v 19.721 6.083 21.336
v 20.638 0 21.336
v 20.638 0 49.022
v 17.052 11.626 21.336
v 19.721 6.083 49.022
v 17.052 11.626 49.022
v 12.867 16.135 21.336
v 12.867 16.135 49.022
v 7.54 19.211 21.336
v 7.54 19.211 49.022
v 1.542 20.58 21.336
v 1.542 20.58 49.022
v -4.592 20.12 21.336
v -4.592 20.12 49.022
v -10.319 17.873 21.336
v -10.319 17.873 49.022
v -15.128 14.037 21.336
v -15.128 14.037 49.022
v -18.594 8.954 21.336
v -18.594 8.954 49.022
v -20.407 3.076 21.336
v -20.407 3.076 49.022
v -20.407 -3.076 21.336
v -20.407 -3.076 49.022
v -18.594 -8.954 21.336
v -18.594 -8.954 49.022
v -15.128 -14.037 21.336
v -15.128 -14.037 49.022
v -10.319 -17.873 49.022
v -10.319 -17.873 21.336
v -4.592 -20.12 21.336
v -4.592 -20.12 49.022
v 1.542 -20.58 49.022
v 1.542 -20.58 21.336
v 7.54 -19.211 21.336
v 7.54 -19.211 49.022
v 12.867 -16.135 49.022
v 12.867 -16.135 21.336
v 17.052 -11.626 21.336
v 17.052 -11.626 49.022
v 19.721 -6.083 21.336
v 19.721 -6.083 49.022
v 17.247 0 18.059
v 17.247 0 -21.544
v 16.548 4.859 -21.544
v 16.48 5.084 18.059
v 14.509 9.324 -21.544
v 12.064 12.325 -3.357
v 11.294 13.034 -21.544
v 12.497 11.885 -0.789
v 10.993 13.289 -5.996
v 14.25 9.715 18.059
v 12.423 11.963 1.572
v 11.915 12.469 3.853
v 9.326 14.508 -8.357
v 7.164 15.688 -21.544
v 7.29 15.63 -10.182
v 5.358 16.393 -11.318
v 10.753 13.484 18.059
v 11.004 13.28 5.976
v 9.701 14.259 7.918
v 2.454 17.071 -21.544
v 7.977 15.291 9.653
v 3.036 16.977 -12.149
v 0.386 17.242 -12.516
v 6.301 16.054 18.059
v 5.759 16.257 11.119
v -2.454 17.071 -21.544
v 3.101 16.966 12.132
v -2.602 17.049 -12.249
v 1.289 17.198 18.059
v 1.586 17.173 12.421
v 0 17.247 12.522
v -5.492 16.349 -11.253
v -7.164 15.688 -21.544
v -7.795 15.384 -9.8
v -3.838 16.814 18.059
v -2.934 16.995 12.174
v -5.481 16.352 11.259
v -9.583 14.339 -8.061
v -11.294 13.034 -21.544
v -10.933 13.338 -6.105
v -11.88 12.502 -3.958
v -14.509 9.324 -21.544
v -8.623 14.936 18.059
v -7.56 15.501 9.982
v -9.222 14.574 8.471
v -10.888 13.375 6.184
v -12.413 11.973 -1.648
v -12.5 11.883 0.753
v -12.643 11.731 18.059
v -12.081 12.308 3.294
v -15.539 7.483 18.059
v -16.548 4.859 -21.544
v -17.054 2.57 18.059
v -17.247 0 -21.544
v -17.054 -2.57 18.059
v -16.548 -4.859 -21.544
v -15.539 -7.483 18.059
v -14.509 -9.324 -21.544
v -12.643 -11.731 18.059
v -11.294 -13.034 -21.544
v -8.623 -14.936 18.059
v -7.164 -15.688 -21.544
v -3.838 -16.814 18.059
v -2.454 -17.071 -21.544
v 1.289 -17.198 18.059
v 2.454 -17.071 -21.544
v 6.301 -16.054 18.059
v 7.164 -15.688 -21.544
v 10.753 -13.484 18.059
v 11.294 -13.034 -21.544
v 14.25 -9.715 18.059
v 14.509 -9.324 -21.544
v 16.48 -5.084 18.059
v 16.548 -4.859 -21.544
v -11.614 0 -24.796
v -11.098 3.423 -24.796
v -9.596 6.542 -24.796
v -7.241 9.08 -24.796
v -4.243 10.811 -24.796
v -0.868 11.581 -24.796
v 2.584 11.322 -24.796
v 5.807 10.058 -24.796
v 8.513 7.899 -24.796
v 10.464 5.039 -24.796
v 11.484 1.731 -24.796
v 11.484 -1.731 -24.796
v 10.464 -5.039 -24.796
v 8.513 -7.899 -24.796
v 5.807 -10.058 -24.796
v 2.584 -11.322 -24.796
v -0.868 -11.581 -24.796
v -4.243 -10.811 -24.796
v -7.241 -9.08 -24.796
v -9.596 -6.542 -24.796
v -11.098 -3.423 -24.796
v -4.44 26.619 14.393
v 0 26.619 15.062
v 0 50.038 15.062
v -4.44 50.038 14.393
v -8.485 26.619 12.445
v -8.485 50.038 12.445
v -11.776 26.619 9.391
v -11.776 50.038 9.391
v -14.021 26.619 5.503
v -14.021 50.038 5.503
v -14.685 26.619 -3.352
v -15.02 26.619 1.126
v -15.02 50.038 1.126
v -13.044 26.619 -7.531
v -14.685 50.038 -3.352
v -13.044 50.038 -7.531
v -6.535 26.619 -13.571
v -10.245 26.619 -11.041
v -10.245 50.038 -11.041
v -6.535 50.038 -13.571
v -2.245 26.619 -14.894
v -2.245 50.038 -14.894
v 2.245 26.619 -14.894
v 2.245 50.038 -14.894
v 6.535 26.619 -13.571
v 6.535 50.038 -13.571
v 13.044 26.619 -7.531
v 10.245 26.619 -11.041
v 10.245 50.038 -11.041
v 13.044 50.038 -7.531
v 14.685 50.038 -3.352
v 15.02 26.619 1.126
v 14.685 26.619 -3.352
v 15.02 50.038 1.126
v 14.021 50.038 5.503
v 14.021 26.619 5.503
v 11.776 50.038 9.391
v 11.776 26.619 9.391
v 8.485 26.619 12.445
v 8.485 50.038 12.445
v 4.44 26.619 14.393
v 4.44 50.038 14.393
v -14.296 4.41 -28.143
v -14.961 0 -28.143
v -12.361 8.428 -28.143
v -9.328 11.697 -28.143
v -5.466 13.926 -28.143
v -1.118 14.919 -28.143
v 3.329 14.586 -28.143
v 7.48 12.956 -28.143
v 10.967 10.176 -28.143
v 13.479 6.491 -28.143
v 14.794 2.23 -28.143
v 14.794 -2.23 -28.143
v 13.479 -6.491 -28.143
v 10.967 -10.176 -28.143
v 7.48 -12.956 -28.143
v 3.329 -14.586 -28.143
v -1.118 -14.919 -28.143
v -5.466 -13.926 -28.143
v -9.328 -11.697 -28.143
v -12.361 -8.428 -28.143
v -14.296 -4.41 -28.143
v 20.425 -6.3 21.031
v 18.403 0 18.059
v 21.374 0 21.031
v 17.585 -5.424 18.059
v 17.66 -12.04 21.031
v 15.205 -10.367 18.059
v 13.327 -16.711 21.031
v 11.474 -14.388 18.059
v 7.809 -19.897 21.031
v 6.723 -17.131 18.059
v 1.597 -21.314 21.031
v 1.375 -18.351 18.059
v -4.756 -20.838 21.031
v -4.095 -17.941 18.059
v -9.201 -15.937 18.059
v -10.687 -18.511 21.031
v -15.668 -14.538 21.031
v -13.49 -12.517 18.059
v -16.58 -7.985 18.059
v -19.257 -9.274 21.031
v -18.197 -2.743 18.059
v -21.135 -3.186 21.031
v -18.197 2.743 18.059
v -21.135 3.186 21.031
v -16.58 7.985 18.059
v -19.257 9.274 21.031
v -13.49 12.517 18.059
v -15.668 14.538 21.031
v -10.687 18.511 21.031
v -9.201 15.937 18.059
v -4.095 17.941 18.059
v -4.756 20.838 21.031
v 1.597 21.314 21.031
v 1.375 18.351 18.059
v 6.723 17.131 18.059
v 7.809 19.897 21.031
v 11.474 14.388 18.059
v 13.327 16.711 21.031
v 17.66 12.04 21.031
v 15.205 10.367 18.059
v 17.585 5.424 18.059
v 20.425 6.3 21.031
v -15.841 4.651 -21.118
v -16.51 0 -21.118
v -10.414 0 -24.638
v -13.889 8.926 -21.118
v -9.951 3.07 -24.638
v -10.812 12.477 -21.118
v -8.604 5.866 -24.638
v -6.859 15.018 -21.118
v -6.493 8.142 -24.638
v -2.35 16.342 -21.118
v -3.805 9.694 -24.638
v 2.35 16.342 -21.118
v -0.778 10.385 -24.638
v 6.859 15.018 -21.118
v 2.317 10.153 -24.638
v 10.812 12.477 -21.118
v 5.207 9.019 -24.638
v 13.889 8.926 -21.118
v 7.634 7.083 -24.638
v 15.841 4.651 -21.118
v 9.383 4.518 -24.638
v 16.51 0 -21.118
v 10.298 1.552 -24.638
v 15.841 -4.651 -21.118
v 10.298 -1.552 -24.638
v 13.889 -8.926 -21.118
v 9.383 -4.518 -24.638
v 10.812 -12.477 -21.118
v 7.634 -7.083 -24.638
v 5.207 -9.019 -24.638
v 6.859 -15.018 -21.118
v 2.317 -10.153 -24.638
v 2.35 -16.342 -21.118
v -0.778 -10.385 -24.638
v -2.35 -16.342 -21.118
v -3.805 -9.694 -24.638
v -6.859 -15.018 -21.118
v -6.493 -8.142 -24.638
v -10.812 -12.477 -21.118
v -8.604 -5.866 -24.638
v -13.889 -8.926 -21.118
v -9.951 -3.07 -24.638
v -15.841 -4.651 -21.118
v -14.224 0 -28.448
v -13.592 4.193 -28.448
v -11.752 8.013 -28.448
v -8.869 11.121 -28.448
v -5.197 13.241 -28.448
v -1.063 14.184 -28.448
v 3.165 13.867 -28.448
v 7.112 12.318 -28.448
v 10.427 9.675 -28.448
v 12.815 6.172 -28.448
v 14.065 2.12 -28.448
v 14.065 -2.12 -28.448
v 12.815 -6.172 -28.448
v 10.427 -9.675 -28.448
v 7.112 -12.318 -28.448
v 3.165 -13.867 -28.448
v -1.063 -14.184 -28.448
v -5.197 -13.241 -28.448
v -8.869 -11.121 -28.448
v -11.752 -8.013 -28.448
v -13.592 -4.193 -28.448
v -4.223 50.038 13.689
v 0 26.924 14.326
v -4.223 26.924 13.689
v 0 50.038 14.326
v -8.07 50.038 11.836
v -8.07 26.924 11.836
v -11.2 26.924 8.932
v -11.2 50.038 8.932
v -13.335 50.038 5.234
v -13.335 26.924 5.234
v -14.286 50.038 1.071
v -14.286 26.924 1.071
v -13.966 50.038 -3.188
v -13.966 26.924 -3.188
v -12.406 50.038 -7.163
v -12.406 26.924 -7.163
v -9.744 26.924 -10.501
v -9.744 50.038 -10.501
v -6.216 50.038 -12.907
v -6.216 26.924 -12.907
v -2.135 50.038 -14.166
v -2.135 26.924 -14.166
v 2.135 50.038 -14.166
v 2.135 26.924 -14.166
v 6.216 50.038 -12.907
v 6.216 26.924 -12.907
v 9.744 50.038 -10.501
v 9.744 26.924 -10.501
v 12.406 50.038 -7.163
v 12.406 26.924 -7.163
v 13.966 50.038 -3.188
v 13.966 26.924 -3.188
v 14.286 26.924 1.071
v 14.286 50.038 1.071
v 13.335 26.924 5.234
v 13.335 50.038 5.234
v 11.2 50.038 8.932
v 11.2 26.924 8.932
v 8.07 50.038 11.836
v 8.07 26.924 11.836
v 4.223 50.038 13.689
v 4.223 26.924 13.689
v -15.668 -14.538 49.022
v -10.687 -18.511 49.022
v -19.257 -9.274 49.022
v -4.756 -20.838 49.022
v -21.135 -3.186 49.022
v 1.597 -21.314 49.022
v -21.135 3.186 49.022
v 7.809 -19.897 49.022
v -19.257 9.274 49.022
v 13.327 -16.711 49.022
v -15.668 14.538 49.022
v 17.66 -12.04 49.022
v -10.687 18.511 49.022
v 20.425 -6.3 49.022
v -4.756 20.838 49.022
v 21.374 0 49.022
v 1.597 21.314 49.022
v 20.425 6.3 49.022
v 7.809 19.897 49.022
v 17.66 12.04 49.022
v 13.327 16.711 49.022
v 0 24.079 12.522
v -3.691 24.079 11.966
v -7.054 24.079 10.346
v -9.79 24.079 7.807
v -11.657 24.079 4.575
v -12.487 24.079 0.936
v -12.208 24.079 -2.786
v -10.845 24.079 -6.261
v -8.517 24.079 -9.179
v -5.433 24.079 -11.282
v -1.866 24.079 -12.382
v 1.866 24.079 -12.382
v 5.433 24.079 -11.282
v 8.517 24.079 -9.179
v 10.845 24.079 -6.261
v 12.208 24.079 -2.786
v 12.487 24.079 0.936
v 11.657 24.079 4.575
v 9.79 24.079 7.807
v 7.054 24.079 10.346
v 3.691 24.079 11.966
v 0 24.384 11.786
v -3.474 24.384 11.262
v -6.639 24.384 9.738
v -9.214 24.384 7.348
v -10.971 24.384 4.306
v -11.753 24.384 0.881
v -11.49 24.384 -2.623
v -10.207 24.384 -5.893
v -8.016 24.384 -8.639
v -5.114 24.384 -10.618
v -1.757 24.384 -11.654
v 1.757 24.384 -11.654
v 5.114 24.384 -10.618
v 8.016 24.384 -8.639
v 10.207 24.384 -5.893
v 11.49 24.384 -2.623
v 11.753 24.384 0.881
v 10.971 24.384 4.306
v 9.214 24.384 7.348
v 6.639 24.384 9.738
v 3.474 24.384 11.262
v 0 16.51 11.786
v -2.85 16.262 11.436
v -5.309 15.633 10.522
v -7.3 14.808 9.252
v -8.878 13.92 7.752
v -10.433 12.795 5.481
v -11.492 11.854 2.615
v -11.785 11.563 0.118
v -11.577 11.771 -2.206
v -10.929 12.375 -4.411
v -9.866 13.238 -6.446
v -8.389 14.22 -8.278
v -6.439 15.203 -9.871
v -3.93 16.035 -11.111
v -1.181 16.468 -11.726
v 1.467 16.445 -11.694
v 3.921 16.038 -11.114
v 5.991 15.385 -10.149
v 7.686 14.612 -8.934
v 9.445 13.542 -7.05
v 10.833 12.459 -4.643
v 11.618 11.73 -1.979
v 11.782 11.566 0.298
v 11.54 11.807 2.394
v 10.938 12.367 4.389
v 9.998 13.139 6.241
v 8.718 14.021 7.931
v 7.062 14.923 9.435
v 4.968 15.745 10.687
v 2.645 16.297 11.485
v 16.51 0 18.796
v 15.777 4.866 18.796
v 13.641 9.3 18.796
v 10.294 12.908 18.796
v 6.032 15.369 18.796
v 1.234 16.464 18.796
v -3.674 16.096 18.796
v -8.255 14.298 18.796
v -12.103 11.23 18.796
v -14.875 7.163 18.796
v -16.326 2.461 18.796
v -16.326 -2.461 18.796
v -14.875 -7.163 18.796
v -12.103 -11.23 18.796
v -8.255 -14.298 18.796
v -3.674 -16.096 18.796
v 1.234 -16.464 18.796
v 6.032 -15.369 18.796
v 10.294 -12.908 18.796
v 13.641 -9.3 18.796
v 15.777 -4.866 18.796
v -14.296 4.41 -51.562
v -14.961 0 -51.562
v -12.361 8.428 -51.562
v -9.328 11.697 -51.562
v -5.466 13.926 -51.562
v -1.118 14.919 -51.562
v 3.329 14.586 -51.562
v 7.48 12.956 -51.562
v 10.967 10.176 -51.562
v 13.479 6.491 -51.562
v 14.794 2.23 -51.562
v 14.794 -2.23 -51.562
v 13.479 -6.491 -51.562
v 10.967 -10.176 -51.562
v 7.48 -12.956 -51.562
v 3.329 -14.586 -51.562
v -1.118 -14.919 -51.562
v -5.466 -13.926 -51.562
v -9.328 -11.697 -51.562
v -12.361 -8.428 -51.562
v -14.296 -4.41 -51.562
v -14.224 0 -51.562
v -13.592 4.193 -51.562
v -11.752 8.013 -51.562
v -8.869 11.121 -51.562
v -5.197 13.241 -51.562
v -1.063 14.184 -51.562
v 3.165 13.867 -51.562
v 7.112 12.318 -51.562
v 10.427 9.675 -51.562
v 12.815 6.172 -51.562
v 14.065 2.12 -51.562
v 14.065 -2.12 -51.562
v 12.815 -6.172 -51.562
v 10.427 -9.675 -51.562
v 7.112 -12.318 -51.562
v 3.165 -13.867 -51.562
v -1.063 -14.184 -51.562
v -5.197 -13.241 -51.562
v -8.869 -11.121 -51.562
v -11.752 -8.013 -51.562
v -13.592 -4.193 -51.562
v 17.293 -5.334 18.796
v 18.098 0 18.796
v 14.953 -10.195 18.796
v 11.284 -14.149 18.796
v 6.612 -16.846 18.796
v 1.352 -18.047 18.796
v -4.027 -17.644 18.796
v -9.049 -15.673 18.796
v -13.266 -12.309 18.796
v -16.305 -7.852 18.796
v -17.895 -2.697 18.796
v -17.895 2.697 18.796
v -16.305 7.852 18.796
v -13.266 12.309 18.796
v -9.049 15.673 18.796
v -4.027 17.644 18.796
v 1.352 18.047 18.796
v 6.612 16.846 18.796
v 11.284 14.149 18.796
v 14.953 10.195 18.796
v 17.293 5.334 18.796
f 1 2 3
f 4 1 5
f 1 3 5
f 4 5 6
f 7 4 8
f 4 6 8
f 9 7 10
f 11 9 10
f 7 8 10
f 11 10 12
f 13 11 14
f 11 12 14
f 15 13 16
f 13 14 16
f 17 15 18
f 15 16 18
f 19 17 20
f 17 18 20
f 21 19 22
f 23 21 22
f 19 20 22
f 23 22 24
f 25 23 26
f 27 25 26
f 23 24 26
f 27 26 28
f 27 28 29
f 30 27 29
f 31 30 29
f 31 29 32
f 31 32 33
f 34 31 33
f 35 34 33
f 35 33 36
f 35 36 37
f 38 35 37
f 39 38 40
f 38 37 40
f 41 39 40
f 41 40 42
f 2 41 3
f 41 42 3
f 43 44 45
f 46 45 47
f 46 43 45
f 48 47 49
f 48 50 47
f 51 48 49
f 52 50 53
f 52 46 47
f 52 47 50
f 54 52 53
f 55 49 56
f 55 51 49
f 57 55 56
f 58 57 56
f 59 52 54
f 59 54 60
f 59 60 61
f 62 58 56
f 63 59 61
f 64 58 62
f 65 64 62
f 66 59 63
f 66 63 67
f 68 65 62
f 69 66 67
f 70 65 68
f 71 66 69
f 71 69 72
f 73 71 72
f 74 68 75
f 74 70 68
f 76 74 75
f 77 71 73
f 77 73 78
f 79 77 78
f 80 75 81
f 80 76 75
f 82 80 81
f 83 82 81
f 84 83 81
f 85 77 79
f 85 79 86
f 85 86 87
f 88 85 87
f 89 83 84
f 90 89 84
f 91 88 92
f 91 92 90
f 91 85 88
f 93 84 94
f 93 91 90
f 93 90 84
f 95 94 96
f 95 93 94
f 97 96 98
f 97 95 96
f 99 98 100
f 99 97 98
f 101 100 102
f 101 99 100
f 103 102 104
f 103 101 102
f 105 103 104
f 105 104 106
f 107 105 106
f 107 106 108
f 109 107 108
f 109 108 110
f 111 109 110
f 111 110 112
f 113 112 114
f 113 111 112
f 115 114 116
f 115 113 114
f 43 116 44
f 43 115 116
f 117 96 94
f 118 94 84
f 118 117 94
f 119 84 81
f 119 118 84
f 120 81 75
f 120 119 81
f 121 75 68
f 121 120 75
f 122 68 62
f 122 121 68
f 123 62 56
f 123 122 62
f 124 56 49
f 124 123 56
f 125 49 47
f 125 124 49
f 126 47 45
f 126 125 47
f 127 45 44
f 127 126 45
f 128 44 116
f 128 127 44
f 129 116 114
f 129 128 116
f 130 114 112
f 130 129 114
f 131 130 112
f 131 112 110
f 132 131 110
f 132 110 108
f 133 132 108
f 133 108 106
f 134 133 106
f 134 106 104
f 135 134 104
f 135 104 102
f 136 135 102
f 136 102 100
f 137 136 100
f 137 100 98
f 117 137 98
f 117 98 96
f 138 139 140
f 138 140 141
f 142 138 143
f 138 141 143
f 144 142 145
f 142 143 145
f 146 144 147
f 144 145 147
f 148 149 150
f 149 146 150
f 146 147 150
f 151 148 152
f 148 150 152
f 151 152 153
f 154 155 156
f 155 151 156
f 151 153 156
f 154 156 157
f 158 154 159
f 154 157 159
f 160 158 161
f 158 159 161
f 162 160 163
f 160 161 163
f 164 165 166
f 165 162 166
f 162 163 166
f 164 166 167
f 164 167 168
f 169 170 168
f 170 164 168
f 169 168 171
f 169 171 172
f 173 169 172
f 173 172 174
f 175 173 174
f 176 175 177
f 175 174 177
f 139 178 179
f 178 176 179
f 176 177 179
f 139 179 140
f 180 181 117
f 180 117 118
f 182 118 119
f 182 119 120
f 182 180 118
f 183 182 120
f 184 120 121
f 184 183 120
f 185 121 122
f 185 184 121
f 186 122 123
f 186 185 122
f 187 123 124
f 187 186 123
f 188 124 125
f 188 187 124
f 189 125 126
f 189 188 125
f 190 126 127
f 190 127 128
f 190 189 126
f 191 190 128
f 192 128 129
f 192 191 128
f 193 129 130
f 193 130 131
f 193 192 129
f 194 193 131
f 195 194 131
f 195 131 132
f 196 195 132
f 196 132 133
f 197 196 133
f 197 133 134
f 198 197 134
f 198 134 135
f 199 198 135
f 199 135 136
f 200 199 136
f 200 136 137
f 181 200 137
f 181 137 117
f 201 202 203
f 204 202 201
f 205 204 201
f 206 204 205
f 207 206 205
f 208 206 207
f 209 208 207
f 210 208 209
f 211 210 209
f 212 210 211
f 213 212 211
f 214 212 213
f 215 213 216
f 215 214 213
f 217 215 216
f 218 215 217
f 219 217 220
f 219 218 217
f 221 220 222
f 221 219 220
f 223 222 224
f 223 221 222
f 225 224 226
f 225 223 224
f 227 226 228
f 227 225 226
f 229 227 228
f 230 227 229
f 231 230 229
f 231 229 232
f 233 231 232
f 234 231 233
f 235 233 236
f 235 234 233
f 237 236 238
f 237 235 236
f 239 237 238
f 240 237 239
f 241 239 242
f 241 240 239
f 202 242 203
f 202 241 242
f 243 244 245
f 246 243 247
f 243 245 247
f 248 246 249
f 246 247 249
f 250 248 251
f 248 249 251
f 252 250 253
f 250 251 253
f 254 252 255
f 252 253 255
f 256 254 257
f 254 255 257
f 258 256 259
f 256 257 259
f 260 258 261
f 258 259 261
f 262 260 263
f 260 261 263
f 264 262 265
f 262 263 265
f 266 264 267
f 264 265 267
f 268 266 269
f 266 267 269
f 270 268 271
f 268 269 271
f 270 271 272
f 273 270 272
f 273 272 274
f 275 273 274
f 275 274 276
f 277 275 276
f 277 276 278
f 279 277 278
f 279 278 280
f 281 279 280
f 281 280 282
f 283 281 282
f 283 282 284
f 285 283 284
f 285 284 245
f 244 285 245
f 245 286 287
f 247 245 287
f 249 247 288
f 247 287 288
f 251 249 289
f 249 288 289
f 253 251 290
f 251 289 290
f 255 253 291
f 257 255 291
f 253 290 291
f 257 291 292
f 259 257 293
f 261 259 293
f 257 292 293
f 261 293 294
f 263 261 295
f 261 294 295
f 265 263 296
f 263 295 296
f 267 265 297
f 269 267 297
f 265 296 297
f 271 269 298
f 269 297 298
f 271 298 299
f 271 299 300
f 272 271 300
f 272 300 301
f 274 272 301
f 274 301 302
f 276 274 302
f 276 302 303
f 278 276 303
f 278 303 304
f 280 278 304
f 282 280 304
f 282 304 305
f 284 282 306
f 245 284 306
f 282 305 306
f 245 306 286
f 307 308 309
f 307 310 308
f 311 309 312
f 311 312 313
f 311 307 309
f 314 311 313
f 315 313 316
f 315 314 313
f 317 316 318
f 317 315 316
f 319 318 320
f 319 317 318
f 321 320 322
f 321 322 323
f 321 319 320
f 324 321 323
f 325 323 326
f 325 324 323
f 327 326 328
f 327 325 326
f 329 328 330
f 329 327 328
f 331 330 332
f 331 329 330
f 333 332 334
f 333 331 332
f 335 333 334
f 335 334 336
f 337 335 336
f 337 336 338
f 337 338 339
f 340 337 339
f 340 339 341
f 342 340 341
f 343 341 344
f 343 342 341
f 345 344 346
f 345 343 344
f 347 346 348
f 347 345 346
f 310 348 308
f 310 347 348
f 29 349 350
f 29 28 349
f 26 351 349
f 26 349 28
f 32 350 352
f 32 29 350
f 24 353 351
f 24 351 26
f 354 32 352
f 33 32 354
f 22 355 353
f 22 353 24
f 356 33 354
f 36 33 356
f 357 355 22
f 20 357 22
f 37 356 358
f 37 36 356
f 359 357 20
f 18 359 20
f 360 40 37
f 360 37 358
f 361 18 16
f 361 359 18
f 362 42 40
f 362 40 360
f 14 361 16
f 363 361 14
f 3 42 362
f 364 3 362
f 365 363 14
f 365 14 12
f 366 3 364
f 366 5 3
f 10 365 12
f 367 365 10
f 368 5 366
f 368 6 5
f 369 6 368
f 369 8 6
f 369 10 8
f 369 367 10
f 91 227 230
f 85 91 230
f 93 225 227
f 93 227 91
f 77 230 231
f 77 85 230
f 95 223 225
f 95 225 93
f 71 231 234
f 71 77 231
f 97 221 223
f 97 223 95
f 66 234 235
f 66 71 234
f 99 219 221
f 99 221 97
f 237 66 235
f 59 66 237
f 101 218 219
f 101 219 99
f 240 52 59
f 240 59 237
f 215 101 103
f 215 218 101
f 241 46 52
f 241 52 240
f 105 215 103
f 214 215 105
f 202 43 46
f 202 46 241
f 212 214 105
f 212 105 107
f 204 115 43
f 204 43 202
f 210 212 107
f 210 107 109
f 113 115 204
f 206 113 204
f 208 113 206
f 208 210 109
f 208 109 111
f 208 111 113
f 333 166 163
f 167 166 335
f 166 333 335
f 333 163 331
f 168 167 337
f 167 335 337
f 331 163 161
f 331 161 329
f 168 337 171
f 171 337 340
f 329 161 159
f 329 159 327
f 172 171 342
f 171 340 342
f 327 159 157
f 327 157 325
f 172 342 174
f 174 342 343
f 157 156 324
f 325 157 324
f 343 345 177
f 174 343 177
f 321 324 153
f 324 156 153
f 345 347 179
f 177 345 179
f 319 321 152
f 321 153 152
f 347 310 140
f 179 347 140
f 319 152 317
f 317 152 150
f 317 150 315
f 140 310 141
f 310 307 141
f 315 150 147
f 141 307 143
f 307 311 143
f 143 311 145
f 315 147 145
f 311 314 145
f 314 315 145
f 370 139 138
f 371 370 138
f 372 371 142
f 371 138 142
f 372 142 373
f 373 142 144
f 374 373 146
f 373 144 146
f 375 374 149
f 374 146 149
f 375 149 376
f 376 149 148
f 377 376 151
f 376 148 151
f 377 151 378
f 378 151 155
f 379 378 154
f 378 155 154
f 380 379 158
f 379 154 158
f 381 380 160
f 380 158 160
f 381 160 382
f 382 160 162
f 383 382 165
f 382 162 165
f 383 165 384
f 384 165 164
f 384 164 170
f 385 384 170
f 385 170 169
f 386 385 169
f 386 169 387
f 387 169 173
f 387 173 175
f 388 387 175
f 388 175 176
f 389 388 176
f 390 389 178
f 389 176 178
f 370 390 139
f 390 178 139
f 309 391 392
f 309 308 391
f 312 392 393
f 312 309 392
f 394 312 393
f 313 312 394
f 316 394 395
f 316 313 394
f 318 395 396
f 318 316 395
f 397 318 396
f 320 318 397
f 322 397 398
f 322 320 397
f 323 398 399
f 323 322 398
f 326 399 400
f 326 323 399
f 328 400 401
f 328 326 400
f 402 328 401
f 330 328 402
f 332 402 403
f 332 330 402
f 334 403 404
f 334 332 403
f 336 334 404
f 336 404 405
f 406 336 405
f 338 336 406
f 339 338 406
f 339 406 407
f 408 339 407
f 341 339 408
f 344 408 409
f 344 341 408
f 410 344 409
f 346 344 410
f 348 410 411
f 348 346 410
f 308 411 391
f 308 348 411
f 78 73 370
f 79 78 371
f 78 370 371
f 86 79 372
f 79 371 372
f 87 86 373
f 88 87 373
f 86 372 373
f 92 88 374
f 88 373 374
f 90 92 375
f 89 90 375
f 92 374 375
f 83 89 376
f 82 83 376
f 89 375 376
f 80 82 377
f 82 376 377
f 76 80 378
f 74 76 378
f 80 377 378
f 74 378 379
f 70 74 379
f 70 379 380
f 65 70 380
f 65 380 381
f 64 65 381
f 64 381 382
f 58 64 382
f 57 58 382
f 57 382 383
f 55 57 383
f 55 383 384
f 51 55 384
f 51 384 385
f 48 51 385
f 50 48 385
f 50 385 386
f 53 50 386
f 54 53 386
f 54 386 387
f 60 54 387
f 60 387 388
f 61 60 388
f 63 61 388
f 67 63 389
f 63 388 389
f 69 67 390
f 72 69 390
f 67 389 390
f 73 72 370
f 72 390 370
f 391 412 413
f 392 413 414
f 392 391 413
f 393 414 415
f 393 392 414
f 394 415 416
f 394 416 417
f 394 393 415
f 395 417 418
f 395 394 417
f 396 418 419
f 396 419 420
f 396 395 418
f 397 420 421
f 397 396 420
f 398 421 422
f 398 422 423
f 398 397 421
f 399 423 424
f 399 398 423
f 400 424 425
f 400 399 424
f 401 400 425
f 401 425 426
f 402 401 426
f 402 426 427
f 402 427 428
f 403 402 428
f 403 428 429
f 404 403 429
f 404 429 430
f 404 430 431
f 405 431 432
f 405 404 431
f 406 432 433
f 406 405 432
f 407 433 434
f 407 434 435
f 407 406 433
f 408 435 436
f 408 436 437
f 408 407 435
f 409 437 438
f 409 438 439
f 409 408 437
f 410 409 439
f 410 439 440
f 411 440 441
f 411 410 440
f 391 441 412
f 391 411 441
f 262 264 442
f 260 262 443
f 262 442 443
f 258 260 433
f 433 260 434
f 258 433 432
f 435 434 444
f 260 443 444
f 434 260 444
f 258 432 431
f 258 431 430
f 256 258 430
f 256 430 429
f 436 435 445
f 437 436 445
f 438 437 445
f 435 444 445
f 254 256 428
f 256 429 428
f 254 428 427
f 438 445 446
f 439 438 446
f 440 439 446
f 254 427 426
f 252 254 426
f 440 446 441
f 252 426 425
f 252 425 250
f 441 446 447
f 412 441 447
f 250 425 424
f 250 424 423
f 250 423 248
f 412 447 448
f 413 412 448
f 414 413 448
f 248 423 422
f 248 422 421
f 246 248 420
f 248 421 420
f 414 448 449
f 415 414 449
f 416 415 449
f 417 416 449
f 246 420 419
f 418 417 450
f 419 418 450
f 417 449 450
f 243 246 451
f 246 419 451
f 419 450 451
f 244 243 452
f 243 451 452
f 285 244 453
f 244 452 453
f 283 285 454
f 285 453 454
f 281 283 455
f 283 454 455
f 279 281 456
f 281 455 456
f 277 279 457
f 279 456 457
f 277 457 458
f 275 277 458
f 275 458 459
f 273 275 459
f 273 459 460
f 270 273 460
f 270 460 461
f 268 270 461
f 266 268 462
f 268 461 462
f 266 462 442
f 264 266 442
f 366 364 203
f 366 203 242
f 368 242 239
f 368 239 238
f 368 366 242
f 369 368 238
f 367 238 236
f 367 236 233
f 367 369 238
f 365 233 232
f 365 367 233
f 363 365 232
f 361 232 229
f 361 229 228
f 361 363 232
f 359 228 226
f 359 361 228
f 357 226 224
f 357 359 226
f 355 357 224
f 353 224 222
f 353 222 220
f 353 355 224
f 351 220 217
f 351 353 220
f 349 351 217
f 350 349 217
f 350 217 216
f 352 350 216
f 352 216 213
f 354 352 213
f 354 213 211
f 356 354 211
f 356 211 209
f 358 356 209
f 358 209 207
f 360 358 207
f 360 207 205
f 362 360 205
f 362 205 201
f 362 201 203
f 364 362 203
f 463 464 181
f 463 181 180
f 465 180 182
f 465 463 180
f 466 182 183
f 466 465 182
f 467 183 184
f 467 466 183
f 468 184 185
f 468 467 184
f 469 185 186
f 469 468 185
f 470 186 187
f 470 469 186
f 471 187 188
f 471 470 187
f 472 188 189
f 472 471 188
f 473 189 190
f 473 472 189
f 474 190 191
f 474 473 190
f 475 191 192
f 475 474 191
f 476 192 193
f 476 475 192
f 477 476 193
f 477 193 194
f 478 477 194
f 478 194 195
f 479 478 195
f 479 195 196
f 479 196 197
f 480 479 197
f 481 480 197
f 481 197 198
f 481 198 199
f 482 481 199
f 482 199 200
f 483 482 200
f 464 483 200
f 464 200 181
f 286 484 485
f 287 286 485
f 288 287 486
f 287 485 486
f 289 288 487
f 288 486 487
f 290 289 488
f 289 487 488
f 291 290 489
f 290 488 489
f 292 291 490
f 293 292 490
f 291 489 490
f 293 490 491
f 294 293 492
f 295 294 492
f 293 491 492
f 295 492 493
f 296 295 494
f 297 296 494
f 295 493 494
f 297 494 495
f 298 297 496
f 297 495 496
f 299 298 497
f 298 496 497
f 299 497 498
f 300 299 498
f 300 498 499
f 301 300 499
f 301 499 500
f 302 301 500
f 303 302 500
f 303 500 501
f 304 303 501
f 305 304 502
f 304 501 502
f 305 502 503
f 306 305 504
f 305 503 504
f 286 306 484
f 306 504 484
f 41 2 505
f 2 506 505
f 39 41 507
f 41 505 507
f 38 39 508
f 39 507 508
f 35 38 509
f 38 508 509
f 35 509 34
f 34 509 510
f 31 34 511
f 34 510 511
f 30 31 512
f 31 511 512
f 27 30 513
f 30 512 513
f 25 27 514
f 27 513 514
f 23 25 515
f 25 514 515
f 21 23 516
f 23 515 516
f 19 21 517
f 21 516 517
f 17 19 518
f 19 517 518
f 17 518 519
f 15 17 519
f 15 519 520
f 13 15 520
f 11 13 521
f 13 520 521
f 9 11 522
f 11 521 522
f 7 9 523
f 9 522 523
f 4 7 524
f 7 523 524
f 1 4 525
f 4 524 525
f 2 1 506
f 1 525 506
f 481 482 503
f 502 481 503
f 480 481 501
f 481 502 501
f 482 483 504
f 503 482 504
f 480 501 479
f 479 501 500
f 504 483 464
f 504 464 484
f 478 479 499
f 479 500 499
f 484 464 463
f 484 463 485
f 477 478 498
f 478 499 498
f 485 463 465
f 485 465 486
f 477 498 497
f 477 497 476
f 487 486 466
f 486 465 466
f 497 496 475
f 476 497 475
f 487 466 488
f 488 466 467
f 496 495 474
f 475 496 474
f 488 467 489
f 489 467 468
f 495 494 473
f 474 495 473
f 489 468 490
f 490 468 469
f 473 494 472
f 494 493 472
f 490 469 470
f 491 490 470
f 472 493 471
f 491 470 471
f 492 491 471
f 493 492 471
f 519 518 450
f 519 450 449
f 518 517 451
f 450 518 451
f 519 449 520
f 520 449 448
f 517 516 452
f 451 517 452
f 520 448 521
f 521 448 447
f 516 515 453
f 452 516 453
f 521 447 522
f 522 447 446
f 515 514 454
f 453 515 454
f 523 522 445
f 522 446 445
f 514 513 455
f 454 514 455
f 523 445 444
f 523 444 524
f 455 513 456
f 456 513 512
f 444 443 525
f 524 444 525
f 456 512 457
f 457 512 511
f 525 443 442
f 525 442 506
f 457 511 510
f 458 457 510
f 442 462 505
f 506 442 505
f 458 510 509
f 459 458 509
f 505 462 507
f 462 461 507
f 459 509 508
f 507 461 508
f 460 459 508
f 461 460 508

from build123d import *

# Parameters (mm, degrees)
SKETCH2_R          = 16.51
SKETCH3_R          = 20.6375
EXTRUDE1_DEPTH     = 27.686
SKETCH4_R          = 20.6375
EXTRUDE2_DEPTH     = 2.54
EXTRUDE2_TAPER     = 45
SKETCH9_R          = 16.51
SKETCH9_R_2        = 14.224
CUT_EXTRUDE4_DEPTH = 23.114
SKETCH10_R         = 16.51
SKETCH10_R_2       = 14.224
CUT_EXTRUDE5_DEPTH = 3.81
CUT_EXTRUDE5_DRAFT = 45
SKETCH11_OUTSIDE_W = 79.734
SKETCH11_OUTSIDE_H = 79.734
SKETCH11_OUTSIDE_R = 10.414
CUT_EXTRUDE6_DEPTH = 3.81
CUT_EXTRUDE6_DRAFT = -60
SHELL3_T           = 0.7366


with BuildPart() as part:
    # Sweep1: sweep along a path in Sketch1
    with BuildLine(Plane(origin=(0, 0, 0), x_dir=(0, 0, -1), z_dir=(1, 0, 0))) as sweep1_path:
        Line((51.562, 0), (-49.022, 0))
    # Sketch2 → Sweep1 (sweep)
    with BuildSketch(Plane.XY.offset(49.022)):
        Circle(SKETCH2_R)
    sweep(path=sweep1_path.line)

    # Sketch3 → Extrude1 (add)
    with BuildSketch(Plane.XY.offset(49.022)):
        Circle(SKETCH3_R)
    extrude(amount=-EXTRUDE1_DEPTH)

    # Sketch4 → Extrude2 (add)
    with BuildSketch(Plane(origin=(0, 0, 21.336), x_dir=(-1, 0, 0), z_dir=(0, 0, -1))):
        with Locations(Location((0, 0, 0), (0, 0, 180))):
            Circle(SKETCH4_R)
    extrude(amount=EXTRUDE2_DEPTH, taper=EXTRUDE2_TAPER)

    # Sketch9 → Cut-Extrude4 (cut)
    with BuildSketch(Plane(origin=(0, 0, -51.562), x_dir=(-1, 0, 0), z_dir=(0, 0, -1))):
        Circle(SKETCH9_R)
        Circle(SKETCH9_R_2, mode=Mode.SUBTRACT)
    extrude(amount=-CUT_EXTRUDE4_DEPTH, mode=Mode.SUBTRACT)


with BuildPart() as cut_extrude5_tool:
    # Sketch10 → Cut-Extrude5 (with draft: the straight prism first)
    with BuildSketch(Plane(origin=(0, 0, -28.448), x_dir=(-1, 0, 0), z_dir=(0, 0, -1))):
        Circle(SKETCH10_R)
        Circle(SKETCH10_R_2, mode=Mode.SUBTRACT)
    extrude(amount=-CUT_EXTRUDE5_DEPTH)
    # Cut-Extrude5: the draft: its side faces are tilted about the plane it starts from
    cut_extrude5_sides = [cut_extrude5_tool.faces().sort_by_distance(p)[0] for p in [
        (16.51, 0, -26.543),
        (14.224, 0, -26.543),
    ]]
    draft(cut_extrude5_sides, Plane(origin=(0, 0, -28.448), x_dir=(-1, 0, 0), z_dir=(0, 0, -1)), CUT_EXTRUDE5_DRAFT)


with BuildPart() as part_1:
    add(part.part)

    # Cut-Extrude5: cut by cut_extrude5_tool
    add(cut_extrude5_tool.part, mode=Mode.SUBTRACT)


with BuildPart() as cut_extrude6_tool:
    # Sketch11 outside → Cut-Extrude6 (with draft: the straight prism first)
    with BuildSketch(Plane(origin=(0, 0, -24.638), x_dir=(-1, 0, 0), z_dir=(0, 0, -1))):
        Rectangle(SKETCH11_OUTSIDE_W, SKETCH11_OUTSIDE_H)
        Circle(SKETCH11_OUTSIDE_R, mode=Mode.SUBTRACT)
    extrude(amount=-CUT_EXTRUDE6_DEPTH)
    # Cut-Extrude6: the draft: its side faces are tilted about the plane it starts from
    cut_extrude6_sides = [cut_extrude6_tool.faces().sort_by_distance(p)[0] for p in [
        (0, -39.867, -22.733),
        (-39.867, 0, -22.733),
        (0, 39.867, -22.733),
        (39.867, 0, -22.733),
        (10.414, 0, -22.733),
    ]]
    draft(cut_extrude6_sides, Plane(origin=(0, 0, -24.638), x_dir=(-1, 0, 0), z_dir=(0, 0, -1)), CUT_EXTRUDE6_DRAFT)


with BuildPart() as part_2:
    add(part_1.part)

    # Cut-Extrude6: cut by cut_extrude6_tool
    add(cut_extrude6_tool.part, mode=Mode.SUBTRACT)


with BuildPart() as body_2:
    # Sketch5 → Revolve1 (revolve)
    with BuildSketch(Plane(origin=(0, 0, 0), x_dir=(0, 0, -1), z_dir=(1, 0, 0)), mode=Mode.PRIVATE) as revolve1_sk:
        Polygon((11.7856, 24.384), (14.3256, 26.924), (14.3256, 50.038), (0, 50.038), (0, 0), (11.7856, 0), align=None)
    revolve(revolve1_sk.sketch.rotate(Axis((0, 50.038, 0), (0, -1, 0)), 180), axis=Axis((0, 50.038, 0), (0, -1, 0)))

    # Combine1: union part
    add(part_2.part)

    # Shell3
    shell3_openings = [body_2.faces().sort_by_distance(p)[0] for p in [
        (0, 0, -51.562),
        (0, 0, 49.022),
        (0, 50.038, 0),
    ]]
    offset(amount=SHELL3_T, openings=shell3_openings, kind=Kind.INTERSECTION)


solid = body_2.part
